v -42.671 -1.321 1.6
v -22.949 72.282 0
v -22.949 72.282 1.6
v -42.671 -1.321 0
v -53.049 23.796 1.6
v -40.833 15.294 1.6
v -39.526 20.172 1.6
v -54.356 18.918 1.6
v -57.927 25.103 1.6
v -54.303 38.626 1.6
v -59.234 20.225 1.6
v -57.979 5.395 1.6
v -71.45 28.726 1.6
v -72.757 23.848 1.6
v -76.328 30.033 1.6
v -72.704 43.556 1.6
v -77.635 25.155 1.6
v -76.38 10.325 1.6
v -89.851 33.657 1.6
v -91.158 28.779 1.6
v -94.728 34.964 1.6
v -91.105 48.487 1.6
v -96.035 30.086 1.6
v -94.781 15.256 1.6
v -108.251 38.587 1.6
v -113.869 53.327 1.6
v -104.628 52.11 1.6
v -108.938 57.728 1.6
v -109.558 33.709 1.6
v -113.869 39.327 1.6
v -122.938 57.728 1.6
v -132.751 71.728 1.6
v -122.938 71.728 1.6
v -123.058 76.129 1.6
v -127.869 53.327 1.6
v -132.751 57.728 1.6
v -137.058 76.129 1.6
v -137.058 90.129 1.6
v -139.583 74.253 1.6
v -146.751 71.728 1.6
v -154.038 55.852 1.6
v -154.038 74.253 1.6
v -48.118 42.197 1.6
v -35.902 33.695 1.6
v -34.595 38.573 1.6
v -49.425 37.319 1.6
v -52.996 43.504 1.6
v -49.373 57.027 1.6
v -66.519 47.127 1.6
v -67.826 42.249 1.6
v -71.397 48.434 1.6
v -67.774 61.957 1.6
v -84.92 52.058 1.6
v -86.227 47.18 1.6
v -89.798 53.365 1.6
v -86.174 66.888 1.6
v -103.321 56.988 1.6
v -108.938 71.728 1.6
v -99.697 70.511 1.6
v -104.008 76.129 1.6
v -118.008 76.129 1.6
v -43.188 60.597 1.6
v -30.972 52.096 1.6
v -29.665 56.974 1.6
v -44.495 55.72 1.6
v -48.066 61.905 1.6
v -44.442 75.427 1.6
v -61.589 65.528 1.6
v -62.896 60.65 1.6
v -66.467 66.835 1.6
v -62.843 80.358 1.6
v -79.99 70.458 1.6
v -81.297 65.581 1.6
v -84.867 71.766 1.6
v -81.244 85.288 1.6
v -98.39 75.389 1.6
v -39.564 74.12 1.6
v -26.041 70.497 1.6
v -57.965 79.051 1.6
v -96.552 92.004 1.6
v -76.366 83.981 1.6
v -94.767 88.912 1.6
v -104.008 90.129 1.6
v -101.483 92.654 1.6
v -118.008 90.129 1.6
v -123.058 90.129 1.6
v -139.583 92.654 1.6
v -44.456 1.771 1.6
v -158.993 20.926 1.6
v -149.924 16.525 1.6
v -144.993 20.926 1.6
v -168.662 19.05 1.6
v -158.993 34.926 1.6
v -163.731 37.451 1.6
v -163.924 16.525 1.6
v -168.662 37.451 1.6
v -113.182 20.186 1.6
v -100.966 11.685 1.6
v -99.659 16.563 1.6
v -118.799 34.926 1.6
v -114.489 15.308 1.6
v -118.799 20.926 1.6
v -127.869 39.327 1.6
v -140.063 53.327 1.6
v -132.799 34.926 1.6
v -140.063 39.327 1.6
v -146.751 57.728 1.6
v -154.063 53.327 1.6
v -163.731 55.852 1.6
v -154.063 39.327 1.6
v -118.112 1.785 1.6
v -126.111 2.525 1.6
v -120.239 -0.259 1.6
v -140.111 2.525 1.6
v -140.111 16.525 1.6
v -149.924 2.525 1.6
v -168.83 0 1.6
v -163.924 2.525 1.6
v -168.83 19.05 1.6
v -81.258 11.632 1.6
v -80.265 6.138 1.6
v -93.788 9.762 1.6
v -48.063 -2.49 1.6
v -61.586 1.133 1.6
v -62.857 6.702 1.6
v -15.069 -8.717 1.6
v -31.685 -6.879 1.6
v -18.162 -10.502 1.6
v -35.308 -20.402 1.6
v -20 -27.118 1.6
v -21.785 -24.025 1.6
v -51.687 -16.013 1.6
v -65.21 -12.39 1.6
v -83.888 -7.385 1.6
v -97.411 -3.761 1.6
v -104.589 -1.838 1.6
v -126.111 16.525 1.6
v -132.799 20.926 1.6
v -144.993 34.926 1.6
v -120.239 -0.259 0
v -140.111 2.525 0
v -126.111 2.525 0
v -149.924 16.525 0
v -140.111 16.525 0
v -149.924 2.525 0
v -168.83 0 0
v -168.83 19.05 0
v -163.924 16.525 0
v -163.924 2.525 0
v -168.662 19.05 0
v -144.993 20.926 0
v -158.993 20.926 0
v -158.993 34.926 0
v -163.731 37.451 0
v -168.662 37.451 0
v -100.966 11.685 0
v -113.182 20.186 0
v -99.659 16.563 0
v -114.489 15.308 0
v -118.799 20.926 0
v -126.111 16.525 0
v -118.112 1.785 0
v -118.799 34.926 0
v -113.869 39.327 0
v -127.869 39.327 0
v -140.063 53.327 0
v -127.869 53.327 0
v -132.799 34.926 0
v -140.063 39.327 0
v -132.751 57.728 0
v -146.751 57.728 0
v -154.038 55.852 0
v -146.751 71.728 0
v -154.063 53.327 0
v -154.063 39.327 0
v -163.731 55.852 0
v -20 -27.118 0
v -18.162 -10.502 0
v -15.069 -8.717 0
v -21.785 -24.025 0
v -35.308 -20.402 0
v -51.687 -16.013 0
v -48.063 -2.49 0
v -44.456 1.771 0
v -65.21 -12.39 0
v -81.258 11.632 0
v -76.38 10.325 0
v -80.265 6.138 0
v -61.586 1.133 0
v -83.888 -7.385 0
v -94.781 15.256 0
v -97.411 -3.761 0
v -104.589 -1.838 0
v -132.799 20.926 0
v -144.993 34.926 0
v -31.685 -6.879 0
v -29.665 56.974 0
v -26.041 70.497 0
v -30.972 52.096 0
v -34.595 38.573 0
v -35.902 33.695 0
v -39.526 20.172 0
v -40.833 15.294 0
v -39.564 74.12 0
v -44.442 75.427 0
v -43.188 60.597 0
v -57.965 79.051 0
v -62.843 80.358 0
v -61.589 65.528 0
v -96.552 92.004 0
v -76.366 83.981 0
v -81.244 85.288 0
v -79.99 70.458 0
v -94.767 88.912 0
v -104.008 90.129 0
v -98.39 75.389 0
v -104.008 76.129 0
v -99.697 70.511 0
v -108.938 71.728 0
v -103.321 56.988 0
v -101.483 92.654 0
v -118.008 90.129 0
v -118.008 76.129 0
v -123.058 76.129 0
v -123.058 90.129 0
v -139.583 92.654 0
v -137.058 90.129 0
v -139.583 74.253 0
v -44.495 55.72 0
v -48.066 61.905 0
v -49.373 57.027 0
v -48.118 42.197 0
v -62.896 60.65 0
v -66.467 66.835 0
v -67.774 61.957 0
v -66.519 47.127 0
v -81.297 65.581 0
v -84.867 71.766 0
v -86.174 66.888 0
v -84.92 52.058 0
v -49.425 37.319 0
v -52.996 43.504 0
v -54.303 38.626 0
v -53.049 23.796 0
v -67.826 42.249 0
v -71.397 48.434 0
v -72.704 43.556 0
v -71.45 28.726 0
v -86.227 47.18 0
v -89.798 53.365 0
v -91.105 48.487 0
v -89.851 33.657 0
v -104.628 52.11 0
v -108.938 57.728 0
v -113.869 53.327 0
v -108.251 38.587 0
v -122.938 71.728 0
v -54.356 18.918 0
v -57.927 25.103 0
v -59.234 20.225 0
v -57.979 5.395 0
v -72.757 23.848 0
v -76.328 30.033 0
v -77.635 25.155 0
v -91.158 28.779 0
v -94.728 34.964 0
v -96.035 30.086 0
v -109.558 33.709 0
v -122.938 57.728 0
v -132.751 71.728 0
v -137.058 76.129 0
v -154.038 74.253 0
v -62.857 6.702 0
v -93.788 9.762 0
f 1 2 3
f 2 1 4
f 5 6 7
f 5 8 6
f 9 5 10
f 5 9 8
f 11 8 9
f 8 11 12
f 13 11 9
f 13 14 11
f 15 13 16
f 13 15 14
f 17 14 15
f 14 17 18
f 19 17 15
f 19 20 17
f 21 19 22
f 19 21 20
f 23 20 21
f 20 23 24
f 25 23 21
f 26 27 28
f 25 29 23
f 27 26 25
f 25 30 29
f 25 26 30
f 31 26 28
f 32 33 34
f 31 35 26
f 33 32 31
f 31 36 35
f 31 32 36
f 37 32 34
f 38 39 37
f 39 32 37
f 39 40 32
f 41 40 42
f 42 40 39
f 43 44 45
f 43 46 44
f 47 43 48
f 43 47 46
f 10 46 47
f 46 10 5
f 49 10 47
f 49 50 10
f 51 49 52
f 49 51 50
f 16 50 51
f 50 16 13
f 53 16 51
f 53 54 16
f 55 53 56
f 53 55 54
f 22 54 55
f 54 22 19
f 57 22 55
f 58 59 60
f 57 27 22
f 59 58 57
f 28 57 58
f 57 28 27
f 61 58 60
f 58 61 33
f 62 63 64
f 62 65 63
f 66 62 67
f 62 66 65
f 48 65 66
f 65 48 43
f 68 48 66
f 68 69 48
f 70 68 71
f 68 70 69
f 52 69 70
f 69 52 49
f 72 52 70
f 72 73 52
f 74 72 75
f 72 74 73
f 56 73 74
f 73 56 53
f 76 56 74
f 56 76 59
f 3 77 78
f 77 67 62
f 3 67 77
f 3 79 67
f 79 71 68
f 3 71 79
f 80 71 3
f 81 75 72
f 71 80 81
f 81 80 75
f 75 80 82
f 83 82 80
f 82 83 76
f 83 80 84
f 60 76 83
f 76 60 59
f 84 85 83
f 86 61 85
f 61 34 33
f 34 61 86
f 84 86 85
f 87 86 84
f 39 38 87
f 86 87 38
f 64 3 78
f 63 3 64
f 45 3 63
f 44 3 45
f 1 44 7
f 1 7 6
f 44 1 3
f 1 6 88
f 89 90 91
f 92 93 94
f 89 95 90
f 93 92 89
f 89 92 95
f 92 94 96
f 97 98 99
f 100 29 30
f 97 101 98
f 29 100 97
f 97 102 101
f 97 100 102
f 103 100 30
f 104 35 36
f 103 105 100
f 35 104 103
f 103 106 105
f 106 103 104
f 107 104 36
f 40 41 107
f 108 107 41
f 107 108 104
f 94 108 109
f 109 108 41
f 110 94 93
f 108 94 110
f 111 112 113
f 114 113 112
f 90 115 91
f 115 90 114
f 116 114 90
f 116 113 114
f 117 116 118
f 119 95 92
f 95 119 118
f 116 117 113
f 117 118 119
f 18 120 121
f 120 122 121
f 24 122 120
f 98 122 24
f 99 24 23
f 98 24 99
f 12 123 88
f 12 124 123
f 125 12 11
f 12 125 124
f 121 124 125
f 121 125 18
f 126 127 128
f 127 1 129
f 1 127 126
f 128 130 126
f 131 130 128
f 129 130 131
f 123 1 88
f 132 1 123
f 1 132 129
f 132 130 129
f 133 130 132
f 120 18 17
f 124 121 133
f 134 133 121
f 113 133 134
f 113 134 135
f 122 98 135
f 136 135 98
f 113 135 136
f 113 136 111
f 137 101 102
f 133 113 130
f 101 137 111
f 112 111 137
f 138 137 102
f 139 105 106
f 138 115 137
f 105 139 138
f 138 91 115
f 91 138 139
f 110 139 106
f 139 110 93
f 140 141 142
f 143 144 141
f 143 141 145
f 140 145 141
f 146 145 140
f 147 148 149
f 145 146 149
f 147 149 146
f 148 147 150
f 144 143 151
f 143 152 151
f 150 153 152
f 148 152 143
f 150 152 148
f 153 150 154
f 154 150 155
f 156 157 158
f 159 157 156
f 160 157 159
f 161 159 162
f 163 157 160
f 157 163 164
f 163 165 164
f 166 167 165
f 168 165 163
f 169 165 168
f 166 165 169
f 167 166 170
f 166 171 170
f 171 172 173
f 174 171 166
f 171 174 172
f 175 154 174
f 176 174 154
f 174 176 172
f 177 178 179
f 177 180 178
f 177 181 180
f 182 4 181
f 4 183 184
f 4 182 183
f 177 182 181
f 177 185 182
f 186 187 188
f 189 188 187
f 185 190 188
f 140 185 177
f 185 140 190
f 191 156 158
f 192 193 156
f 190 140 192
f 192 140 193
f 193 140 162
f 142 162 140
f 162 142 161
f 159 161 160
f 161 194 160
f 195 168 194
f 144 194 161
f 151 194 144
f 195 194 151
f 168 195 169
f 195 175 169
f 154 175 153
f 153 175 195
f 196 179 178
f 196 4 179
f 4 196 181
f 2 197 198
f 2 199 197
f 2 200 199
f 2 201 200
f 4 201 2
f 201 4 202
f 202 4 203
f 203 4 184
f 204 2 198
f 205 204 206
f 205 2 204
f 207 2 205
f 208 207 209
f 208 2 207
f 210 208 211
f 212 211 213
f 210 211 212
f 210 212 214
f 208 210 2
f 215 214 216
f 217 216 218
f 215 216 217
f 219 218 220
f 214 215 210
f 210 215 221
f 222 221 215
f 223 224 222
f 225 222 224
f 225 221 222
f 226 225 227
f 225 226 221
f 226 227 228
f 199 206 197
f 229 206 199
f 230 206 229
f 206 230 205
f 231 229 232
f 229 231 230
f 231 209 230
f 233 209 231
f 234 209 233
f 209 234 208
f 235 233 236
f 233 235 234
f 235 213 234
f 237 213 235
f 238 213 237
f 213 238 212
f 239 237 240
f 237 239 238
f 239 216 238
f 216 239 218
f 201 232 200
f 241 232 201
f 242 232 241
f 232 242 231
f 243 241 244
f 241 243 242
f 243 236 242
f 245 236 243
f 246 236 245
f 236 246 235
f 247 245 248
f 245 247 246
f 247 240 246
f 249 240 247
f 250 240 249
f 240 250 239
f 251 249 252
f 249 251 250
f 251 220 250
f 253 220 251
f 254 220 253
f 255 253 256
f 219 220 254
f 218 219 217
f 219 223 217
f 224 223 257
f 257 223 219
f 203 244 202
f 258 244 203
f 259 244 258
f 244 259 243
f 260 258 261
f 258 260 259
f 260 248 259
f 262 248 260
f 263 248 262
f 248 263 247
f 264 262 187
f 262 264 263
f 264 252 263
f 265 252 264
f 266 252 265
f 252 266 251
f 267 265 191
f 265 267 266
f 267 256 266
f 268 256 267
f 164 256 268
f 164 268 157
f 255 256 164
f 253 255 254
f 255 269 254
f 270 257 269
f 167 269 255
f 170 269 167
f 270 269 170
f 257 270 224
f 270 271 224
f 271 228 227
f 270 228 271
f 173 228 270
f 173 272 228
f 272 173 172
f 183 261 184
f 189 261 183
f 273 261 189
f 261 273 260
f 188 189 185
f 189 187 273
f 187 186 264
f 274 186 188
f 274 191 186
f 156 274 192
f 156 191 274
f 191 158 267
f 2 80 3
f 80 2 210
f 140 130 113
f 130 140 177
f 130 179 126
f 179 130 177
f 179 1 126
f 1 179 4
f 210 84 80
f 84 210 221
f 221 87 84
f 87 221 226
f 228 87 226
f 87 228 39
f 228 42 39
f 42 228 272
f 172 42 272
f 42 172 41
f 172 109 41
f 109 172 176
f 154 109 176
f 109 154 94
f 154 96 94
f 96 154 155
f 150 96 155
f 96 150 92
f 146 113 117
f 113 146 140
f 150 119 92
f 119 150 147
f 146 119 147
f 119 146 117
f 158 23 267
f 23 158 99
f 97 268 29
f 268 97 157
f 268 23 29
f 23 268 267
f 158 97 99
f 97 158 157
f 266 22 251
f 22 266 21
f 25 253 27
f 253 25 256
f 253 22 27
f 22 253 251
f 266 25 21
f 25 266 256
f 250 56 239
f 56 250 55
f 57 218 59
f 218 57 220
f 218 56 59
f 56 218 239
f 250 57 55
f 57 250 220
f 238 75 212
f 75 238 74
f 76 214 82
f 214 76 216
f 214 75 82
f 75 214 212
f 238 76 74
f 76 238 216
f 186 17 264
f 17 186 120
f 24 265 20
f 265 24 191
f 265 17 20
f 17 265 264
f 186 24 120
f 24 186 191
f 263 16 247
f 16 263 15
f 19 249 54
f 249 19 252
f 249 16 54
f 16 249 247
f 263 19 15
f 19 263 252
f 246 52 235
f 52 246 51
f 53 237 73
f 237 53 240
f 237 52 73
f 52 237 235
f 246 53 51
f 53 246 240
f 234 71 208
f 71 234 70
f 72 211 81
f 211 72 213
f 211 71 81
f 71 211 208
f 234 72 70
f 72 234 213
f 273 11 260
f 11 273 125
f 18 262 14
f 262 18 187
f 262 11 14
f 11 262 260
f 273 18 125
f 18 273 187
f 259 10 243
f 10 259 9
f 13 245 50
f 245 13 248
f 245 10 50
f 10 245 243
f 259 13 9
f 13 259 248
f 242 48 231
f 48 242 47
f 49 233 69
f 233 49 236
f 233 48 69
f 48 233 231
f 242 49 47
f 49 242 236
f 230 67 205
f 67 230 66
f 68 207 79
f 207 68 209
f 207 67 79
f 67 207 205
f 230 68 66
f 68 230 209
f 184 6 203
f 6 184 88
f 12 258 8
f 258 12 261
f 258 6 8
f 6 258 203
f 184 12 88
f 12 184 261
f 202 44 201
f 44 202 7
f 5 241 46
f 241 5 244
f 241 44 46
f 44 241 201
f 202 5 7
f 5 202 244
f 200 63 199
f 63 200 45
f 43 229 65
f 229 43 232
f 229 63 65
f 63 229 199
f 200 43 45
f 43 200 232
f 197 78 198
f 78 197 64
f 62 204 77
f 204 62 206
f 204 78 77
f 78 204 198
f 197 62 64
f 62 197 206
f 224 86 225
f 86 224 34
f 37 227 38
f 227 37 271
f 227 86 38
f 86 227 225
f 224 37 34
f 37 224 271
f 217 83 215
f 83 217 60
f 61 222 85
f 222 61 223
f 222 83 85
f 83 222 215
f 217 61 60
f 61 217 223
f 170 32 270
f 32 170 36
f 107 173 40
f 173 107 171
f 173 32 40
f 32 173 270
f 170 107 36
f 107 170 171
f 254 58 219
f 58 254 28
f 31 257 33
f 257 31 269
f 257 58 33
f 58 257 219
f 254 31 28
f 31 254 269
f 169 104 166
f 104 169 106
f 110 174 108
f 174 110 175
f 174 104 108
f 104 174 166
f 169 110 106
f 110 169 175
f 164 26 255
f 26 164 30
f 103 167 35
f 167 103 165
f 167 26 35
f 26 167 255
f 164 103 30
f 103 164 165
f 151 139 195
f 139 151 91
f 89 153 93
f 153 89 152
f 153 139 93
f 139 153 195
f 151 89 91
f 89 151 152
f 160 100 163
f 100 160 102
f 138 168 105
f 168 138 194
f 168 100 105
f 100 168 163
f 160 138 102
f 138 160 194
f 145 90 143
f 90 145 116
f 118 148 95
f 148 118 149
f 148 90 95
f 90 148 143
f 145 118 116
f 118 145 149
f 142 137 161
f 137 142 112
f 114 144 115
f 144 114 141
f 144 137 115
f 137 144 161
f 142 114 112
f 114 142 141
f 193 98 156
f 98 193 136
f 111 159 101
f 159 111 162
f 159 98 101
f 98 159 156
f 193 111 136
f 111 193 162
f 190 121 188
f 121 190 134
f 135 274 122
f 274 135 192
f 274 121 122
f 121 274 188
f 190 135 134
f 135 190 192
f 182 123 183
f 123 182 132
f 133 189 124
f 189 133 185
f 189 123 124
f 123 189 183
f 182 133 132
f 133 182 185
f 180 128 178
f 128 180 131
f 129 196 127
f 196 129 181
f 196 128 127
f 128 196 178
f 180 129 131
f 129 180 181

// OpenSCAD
// please note that the plate produced by this file doesn't have the correct spacing on the pinky columns

KEY_UNIT = 19.05;
KEY_HOLE = 14;
KEY_SPACING = (KEY_UNIT-KEY_HOLE)/2;
ANGLE = 15;
HALF_SPACING = 40;
PLATE_THICKNESS = 1.6;

//plate_right();
plate_left();
//plate_middle();

module plate_middle() {
    translate([-3*KEY_UNIT/2,0,0])
    difference() {
        // 3x3
        cube([3*KEY_UNIT,3*KEY_UNIT,PLATE_THICKNESS]);
        for(i=[0:3]) {
            for(j=[0:3]) {
                translate([KEY_SPACING,KEY_SPACING,-1])
                translate([i*KEY_UNIT,j*KEY_UNIT,0]) cube([KEY_HOLE,KEY_HOLE,PLATE_THICKNESS+2]);
            }
        }
    }
}

module plate_right() {
    translate([5.5*KEY_UNIT*cos(ANGLE)+HALF_SPACING/2,0,0])
    rotate([0,0,ANGLE])
    difference() {
        //// plate
        union() {
            translate([-4*KEY_UNIT,0,0]) union() {
                cube([4*KEY_UNIT,5*KEY_UNIT,PLATE_THICKNESS]);
                translate([-1.5*KEY_UNIT,0,0]) cube([5.5*KEY_UNIT,KEY_UNIT,PLATE_THICKNESS]);
            }
            translate([0,4*KEY_UNIT,0]) hull() {
                translate([-1,0,0]) cube([1,KEY_UNIT,PLATE_THICKNESS]);
                rotate([0,0,-ANGLE]) cube([KEY_UNIT*2,KEY_UNIT,PLATE_THICKNESS]);
            }
            translate([0,3*KEY_UNIT,0]) hull() {
                translate([-1,0,0]) cube([1,KEY_UNIT,PLATE_THICKNESS]);
                rotate([0,0,-ANGLE]) cube([KEY_UNIT*2.5,KEY_UNIT,PLATE_THICKNESS]);
            }
            translate([0,2*KEY_UNIT,0]) hull() {
                translate([-1,0,0]) cube([1,KEY_UNIT,PLATE_THICKNESS]);
                rotate([0,0,-ANGLE]) cube([KEY_UNIT*2.75,KEY_UNIT,PLATE_THICKNESS]);
            }
            translate([0,1*KEY_UNIT,0]) hull() {
                translate([-1,0,0]) cube([1,KEY_UNIT,PLATE_THICKNESS]);
                rotate([0,0,-ANGLE]) cube([KEY_UNIT*3.25,KEY_UNIT,PLATE_THICKNESS]);
            }
            translate([0,0*KEY_UNIT,0]) hull() {
                translate([-1,0,0]) cube([1,KEY_UNIT,PLATE_THICKNESS]);
                rotate([0,0,-ANGLE]) cube([KEY_UNIT*2.75,KEY_UNIT,PLATE_THICKNESS]);
            }
        }
        //// holes
        for(i=[0:3]) {
            for(j=[0:3]) {
                translate([-4*KEY_UNIT,0,0])
                translate([0,KEY_UNIT,0])
                translate([KEY_SPACING,KEY_SPACING,-1])
                translate([i*KEY_UNIT,j*KEY_UNIT,0]) cube([KEY_HOLE,KEY_HOLE,PLATE_THICKNESS+2]);
            }
        }
        translate([-5.5*KEY_UNIT,0,0]) union() {
            translate([KEY_SPACING,KEY_SPACING,-1]) cube([KEY_HOLE,KEY_HOLE,PLATE_THICKNESS+2]);
            translate([KEY_SPACING+KEY_UNIT*(1+1/2),KEY_SPACING,-1]) cube([KEY_HOLE,KEY_HOLE,PLATE_THICKNESS+2]);
            translate([KEY_SPACING+KEY_UNIT*(1+2+0.25/2),KEY_SPACING,-1]) cube([KEY_HOLE,KEY_HOLE,PLATE_THICKNESS+2]);
            translate([KEY_SPACING+KEY_UNIT*(1+2+1.25+0.25/2),KEY_SPACING,-1]) cube([KEY_HOLE,KEY_HOLE,PLATE_THICKNESS+2]);
        }
        // mods
        translate([0,4*KEY_UNIT,0]) rotate([0,0,-ANGLE]) translate([KEY_SPACING,KEY_SPACING,-1]) union() {
            cube([KEY_HOLE,KEY_HOLE,PLATE_THICKNESS+2]);
            translate([KEY_UNIT,0,0]) cube([KEY_HOLE,KEY_HOLE,PLATE_THICKNESS+2]);
        }
        translate([0,3*KEY_UNIT,0]) rotate([0,0,-ANGLE]) translate([KEY_SPACING,KEY_SPACING,-1]) union() {
            cube([KEY_HOLE,KEY_HOLE,PLATE_THICKNESS+2]);
            translate([(1+0.5/2)*KEY_UNIT,0,0]) cube([KEY_HOLE,KEY_HOLE,PLATE_THICKNESS+2]);
        }
        translate([0,2*KEY_UNIT,0]) rotate([0,0,-ANGLE]) translate([KEY_SPACING,KEY_SPACING,-1]) union() {
            cube([KEY_HOLE,KEY_HOLE,PLATE_THICKNESS+2]);
            translate([(1+0.75/2)*KEY_UNIT,0,0]) cube([KEY_HOLE,KEY_HOLE,PLATE_THICKNESS+2]);
        }
        translate([0,1*KEY_UNIT,0]) rotate([0,0,-ANGLE]) translate([KEY_SPACING,KEY_SPACING,-1]) union() {
            cube([KEY_HOLE,KEY_HOLE,PLATE_THICKNESS+2]);
            translate([(1+0.25/2)*KEY_UNIT,0,0]) cube([KEY_HOLE,KEY_HOLE,PLATE_THICKNESS+2]);
            translate([(1+1.25)*KEY_UNIT,0,0]) cube([KEY_HOLE,KEY_HOLE,PLATE_THICKNESS+2]);
        }
        translate([0,0*KEY_UNIT,0]) rotate([0,0,-ANGLE]) translate([KEY_SPACING,KEY_SPACING,-1]) union() {
            translate([(0.25/2)*KEY_UNIT,0,0]) cube([KEY_HOLE,KEY_HOLE,PLATE_THICKNESS+2]);
            translate([(1.25+0.5/2)*KEY_UNIT,0,0]) cube([KEY_HOLE,KEY_HOLE,PLATE_THICKNESS+2]);
        }
    }
}

module plate_left() {
    translate([-5.5*KEY_UNIT*cos(ANGLE)-HALF_SPACING/2,0,0])
    rotate([0,0,-ANGLE])
    difference() {
        //// plate
        union() {
            cube([4*KEY_UNIT,5*KEY_UNIT,PLATE_THICKNESS]);
            cube([5.5*KEY_UNIT,KEY_UNIT,PLATE_THICKNESS]);
            translate([0,4*KEY_UNIT,0]) hull() {
                cube([1,KEY_UNIT,PLATE_THICKNESS]);
                rotate([0,0,ANGLE]) translate([-KEY_UNIT*2,0,0]) cube([KEY_UNIT*2,KEY_UNIT,PLATE_THICKNESS]);
            }
            translate([0,3*KEY_UNIT,0]) hull() {
                cube([1,KEY_UNIT,PLATE_THICKNESS]);
                rotate([0,0,ANGLE]) translate([-KEY_UNIT*2.5,0,0]) cube([KEY_UNIT*2.5,KEY_UNIT,PLATE_THICKNESS]);
            }
            translate([0,2*KEY_UNIT,0]) hull() {
                cube([1,KEY_UNIT,PLATE_THICKNESS]);
                rotate([0,0,ANGLE]) translate([-KEY_UNIT*2.75,0,0]) cube([KEY_UNIT*2.75,KEY_UNIT,PLATE_THICKNESS]);
            }
            translate([0,1*KEY_UNIT,0]) hull() {
                cube([1,KEY_UNIT,PLATE_THICKNESS]);
                rotate([0,0,ANGLE]) translate([-KEY_UNIT*2.75,0,0]) cube([KEY_UNIT*2.75,KEY_UNIT,PLATE_THICKNESS]);
            }
            translate([0,0*KEY_UNIT,0]) hull() {
                cube([1,KEY_UNIT,PLATE_THICKNESS]);
                rotate([0,0,ANGLE]) translate([-KEY_UNIT*2.5,0,0]) cube([KEY_UNIT*2.25,KEY_UNIT,PLATE_THICKNESS]);
            }
        }
        //// holes
        for(i=[0:3]) {
            for(j=[0:3]) {
                translate([0,KEY_UNIT,0])
                translate([KEY_SPACING,KEY_SPACING,-1])
                translate([i*KEY_UNIT,j*KEY_UNIT,0]) cube([KEY_HOLE,KEY_HOLE,PLATE_THICKNESS+2]);
            }
        }
        // bottom row
        translate([KEY_SPACING,KEY_SPACING,-1]) cube([KEY_HOLE,KEY_HOLE,PLATE_THICKNESS+2]);
        translate([KEY_SPACING+KEY_UNIT*(1+0.25/2),KEY_SPACING,-1]) cube([KEY_HOLE,KEY_HOLE,PLATE_THICKNESS+2]);
        translate([KEY_SPACING+KEY_UNIT*(1.25+1+1.25/2),KEY_SPACING,-1]) cube([KEY_HOLE,KEY_HOLE,PLATE_THICKNESS+2]);
        translate([KEY_SPACING+KEY_UNIT*(1.25+2.25+1),KEY_SPACING,-1]) cube([KEY_HOLE,KEY_HOLE,PLATE_THICKNESS+2]);
        // mods
        translate([0,4*KEY_UNIT,0]) rotate([0,0,ANGLE]) translate([-KEY_UNIT*2+KEY_SPACING,KEY_SPACING,-1]) union() {
            cube([KEY_HOLE,KEY_HOLE,PLATE_THICKNESS+2]);
            translate([KEY_UNIT,0,0]) cube([KEY_HOLE,KEY_HOLE,PLATE_THICKNESS+2]);
        }
        translate([0,3*KEY_UNIT,0]) rotate([0,0,ANGLE]) translate([-KEY_UNIT*2.5+KEY_SPACING,KEY_SPACING,-1]) union() {
            translate([(0.5/2)*KEY_UNIT,0,0]) cube([KEY_HOLE,KEY_HOLE,PLATE_THICKNESS+2]);
            translate([1.5*KEY_UNIT,0,0]) cube([KEY_HOLE,KEY_HOLE,PLATE_THICKNESS+2]);
        }
        translate([0,2*KEY_UNIT,0]) rotate([0,0,ANGLE]) translate([-KEY_UNIT*2.75+KEY_SPACING,KEY_SPACING,-1]) union() {
            translate([(0.75/2)*KEY_UNIT,0,0]) cube([KEY_HOLE,KEY_HOLE,PLATE_THICKNESS+2]);
            translate([1.75*KEY_UNIT,0,0]) cube([KEY_HOLE,KEY_HOLE,PLATE_THICKNESS+2]);
        }
        translate([0,1*KEY_UNIT,0]) rotate([0,0,ANGLE]) translate([-KEY_UNIT*2.75+KEY_SPACING,KEY_SPACING,-1]) union() {
            translate([(0.75/2)*KEY_UNIT,0,0]) cube([KEY_HOLE,KEY_HOLE,PLATE_THICKNESS+2]);
            translate([1.75*KEY_UNIT,0,0]) cube([KEY_HOLE,KEY_HOLE,PLATE_THICKNESS+2]);
        }
        translate([0,0*KEY_UNIT,0]) rotate([0,0,ANGLE]) translate([-KEY_UNIT*2.5+KEY_SPACING,KEY_SPACING,-1]) union() {
            translate([(0.25/2)*KEY_UNIT,0,0]) cube([KEY_HOLE,KEY_HOLE,PLATE_THICKNESS+2]);
            translate([(1.25+0.25/2)*KEY_UNIT,0,0]) cube([KEY_HOLE,KEY_HOLE,PLATE_THICKNESS+2]);
        }

    }
}
